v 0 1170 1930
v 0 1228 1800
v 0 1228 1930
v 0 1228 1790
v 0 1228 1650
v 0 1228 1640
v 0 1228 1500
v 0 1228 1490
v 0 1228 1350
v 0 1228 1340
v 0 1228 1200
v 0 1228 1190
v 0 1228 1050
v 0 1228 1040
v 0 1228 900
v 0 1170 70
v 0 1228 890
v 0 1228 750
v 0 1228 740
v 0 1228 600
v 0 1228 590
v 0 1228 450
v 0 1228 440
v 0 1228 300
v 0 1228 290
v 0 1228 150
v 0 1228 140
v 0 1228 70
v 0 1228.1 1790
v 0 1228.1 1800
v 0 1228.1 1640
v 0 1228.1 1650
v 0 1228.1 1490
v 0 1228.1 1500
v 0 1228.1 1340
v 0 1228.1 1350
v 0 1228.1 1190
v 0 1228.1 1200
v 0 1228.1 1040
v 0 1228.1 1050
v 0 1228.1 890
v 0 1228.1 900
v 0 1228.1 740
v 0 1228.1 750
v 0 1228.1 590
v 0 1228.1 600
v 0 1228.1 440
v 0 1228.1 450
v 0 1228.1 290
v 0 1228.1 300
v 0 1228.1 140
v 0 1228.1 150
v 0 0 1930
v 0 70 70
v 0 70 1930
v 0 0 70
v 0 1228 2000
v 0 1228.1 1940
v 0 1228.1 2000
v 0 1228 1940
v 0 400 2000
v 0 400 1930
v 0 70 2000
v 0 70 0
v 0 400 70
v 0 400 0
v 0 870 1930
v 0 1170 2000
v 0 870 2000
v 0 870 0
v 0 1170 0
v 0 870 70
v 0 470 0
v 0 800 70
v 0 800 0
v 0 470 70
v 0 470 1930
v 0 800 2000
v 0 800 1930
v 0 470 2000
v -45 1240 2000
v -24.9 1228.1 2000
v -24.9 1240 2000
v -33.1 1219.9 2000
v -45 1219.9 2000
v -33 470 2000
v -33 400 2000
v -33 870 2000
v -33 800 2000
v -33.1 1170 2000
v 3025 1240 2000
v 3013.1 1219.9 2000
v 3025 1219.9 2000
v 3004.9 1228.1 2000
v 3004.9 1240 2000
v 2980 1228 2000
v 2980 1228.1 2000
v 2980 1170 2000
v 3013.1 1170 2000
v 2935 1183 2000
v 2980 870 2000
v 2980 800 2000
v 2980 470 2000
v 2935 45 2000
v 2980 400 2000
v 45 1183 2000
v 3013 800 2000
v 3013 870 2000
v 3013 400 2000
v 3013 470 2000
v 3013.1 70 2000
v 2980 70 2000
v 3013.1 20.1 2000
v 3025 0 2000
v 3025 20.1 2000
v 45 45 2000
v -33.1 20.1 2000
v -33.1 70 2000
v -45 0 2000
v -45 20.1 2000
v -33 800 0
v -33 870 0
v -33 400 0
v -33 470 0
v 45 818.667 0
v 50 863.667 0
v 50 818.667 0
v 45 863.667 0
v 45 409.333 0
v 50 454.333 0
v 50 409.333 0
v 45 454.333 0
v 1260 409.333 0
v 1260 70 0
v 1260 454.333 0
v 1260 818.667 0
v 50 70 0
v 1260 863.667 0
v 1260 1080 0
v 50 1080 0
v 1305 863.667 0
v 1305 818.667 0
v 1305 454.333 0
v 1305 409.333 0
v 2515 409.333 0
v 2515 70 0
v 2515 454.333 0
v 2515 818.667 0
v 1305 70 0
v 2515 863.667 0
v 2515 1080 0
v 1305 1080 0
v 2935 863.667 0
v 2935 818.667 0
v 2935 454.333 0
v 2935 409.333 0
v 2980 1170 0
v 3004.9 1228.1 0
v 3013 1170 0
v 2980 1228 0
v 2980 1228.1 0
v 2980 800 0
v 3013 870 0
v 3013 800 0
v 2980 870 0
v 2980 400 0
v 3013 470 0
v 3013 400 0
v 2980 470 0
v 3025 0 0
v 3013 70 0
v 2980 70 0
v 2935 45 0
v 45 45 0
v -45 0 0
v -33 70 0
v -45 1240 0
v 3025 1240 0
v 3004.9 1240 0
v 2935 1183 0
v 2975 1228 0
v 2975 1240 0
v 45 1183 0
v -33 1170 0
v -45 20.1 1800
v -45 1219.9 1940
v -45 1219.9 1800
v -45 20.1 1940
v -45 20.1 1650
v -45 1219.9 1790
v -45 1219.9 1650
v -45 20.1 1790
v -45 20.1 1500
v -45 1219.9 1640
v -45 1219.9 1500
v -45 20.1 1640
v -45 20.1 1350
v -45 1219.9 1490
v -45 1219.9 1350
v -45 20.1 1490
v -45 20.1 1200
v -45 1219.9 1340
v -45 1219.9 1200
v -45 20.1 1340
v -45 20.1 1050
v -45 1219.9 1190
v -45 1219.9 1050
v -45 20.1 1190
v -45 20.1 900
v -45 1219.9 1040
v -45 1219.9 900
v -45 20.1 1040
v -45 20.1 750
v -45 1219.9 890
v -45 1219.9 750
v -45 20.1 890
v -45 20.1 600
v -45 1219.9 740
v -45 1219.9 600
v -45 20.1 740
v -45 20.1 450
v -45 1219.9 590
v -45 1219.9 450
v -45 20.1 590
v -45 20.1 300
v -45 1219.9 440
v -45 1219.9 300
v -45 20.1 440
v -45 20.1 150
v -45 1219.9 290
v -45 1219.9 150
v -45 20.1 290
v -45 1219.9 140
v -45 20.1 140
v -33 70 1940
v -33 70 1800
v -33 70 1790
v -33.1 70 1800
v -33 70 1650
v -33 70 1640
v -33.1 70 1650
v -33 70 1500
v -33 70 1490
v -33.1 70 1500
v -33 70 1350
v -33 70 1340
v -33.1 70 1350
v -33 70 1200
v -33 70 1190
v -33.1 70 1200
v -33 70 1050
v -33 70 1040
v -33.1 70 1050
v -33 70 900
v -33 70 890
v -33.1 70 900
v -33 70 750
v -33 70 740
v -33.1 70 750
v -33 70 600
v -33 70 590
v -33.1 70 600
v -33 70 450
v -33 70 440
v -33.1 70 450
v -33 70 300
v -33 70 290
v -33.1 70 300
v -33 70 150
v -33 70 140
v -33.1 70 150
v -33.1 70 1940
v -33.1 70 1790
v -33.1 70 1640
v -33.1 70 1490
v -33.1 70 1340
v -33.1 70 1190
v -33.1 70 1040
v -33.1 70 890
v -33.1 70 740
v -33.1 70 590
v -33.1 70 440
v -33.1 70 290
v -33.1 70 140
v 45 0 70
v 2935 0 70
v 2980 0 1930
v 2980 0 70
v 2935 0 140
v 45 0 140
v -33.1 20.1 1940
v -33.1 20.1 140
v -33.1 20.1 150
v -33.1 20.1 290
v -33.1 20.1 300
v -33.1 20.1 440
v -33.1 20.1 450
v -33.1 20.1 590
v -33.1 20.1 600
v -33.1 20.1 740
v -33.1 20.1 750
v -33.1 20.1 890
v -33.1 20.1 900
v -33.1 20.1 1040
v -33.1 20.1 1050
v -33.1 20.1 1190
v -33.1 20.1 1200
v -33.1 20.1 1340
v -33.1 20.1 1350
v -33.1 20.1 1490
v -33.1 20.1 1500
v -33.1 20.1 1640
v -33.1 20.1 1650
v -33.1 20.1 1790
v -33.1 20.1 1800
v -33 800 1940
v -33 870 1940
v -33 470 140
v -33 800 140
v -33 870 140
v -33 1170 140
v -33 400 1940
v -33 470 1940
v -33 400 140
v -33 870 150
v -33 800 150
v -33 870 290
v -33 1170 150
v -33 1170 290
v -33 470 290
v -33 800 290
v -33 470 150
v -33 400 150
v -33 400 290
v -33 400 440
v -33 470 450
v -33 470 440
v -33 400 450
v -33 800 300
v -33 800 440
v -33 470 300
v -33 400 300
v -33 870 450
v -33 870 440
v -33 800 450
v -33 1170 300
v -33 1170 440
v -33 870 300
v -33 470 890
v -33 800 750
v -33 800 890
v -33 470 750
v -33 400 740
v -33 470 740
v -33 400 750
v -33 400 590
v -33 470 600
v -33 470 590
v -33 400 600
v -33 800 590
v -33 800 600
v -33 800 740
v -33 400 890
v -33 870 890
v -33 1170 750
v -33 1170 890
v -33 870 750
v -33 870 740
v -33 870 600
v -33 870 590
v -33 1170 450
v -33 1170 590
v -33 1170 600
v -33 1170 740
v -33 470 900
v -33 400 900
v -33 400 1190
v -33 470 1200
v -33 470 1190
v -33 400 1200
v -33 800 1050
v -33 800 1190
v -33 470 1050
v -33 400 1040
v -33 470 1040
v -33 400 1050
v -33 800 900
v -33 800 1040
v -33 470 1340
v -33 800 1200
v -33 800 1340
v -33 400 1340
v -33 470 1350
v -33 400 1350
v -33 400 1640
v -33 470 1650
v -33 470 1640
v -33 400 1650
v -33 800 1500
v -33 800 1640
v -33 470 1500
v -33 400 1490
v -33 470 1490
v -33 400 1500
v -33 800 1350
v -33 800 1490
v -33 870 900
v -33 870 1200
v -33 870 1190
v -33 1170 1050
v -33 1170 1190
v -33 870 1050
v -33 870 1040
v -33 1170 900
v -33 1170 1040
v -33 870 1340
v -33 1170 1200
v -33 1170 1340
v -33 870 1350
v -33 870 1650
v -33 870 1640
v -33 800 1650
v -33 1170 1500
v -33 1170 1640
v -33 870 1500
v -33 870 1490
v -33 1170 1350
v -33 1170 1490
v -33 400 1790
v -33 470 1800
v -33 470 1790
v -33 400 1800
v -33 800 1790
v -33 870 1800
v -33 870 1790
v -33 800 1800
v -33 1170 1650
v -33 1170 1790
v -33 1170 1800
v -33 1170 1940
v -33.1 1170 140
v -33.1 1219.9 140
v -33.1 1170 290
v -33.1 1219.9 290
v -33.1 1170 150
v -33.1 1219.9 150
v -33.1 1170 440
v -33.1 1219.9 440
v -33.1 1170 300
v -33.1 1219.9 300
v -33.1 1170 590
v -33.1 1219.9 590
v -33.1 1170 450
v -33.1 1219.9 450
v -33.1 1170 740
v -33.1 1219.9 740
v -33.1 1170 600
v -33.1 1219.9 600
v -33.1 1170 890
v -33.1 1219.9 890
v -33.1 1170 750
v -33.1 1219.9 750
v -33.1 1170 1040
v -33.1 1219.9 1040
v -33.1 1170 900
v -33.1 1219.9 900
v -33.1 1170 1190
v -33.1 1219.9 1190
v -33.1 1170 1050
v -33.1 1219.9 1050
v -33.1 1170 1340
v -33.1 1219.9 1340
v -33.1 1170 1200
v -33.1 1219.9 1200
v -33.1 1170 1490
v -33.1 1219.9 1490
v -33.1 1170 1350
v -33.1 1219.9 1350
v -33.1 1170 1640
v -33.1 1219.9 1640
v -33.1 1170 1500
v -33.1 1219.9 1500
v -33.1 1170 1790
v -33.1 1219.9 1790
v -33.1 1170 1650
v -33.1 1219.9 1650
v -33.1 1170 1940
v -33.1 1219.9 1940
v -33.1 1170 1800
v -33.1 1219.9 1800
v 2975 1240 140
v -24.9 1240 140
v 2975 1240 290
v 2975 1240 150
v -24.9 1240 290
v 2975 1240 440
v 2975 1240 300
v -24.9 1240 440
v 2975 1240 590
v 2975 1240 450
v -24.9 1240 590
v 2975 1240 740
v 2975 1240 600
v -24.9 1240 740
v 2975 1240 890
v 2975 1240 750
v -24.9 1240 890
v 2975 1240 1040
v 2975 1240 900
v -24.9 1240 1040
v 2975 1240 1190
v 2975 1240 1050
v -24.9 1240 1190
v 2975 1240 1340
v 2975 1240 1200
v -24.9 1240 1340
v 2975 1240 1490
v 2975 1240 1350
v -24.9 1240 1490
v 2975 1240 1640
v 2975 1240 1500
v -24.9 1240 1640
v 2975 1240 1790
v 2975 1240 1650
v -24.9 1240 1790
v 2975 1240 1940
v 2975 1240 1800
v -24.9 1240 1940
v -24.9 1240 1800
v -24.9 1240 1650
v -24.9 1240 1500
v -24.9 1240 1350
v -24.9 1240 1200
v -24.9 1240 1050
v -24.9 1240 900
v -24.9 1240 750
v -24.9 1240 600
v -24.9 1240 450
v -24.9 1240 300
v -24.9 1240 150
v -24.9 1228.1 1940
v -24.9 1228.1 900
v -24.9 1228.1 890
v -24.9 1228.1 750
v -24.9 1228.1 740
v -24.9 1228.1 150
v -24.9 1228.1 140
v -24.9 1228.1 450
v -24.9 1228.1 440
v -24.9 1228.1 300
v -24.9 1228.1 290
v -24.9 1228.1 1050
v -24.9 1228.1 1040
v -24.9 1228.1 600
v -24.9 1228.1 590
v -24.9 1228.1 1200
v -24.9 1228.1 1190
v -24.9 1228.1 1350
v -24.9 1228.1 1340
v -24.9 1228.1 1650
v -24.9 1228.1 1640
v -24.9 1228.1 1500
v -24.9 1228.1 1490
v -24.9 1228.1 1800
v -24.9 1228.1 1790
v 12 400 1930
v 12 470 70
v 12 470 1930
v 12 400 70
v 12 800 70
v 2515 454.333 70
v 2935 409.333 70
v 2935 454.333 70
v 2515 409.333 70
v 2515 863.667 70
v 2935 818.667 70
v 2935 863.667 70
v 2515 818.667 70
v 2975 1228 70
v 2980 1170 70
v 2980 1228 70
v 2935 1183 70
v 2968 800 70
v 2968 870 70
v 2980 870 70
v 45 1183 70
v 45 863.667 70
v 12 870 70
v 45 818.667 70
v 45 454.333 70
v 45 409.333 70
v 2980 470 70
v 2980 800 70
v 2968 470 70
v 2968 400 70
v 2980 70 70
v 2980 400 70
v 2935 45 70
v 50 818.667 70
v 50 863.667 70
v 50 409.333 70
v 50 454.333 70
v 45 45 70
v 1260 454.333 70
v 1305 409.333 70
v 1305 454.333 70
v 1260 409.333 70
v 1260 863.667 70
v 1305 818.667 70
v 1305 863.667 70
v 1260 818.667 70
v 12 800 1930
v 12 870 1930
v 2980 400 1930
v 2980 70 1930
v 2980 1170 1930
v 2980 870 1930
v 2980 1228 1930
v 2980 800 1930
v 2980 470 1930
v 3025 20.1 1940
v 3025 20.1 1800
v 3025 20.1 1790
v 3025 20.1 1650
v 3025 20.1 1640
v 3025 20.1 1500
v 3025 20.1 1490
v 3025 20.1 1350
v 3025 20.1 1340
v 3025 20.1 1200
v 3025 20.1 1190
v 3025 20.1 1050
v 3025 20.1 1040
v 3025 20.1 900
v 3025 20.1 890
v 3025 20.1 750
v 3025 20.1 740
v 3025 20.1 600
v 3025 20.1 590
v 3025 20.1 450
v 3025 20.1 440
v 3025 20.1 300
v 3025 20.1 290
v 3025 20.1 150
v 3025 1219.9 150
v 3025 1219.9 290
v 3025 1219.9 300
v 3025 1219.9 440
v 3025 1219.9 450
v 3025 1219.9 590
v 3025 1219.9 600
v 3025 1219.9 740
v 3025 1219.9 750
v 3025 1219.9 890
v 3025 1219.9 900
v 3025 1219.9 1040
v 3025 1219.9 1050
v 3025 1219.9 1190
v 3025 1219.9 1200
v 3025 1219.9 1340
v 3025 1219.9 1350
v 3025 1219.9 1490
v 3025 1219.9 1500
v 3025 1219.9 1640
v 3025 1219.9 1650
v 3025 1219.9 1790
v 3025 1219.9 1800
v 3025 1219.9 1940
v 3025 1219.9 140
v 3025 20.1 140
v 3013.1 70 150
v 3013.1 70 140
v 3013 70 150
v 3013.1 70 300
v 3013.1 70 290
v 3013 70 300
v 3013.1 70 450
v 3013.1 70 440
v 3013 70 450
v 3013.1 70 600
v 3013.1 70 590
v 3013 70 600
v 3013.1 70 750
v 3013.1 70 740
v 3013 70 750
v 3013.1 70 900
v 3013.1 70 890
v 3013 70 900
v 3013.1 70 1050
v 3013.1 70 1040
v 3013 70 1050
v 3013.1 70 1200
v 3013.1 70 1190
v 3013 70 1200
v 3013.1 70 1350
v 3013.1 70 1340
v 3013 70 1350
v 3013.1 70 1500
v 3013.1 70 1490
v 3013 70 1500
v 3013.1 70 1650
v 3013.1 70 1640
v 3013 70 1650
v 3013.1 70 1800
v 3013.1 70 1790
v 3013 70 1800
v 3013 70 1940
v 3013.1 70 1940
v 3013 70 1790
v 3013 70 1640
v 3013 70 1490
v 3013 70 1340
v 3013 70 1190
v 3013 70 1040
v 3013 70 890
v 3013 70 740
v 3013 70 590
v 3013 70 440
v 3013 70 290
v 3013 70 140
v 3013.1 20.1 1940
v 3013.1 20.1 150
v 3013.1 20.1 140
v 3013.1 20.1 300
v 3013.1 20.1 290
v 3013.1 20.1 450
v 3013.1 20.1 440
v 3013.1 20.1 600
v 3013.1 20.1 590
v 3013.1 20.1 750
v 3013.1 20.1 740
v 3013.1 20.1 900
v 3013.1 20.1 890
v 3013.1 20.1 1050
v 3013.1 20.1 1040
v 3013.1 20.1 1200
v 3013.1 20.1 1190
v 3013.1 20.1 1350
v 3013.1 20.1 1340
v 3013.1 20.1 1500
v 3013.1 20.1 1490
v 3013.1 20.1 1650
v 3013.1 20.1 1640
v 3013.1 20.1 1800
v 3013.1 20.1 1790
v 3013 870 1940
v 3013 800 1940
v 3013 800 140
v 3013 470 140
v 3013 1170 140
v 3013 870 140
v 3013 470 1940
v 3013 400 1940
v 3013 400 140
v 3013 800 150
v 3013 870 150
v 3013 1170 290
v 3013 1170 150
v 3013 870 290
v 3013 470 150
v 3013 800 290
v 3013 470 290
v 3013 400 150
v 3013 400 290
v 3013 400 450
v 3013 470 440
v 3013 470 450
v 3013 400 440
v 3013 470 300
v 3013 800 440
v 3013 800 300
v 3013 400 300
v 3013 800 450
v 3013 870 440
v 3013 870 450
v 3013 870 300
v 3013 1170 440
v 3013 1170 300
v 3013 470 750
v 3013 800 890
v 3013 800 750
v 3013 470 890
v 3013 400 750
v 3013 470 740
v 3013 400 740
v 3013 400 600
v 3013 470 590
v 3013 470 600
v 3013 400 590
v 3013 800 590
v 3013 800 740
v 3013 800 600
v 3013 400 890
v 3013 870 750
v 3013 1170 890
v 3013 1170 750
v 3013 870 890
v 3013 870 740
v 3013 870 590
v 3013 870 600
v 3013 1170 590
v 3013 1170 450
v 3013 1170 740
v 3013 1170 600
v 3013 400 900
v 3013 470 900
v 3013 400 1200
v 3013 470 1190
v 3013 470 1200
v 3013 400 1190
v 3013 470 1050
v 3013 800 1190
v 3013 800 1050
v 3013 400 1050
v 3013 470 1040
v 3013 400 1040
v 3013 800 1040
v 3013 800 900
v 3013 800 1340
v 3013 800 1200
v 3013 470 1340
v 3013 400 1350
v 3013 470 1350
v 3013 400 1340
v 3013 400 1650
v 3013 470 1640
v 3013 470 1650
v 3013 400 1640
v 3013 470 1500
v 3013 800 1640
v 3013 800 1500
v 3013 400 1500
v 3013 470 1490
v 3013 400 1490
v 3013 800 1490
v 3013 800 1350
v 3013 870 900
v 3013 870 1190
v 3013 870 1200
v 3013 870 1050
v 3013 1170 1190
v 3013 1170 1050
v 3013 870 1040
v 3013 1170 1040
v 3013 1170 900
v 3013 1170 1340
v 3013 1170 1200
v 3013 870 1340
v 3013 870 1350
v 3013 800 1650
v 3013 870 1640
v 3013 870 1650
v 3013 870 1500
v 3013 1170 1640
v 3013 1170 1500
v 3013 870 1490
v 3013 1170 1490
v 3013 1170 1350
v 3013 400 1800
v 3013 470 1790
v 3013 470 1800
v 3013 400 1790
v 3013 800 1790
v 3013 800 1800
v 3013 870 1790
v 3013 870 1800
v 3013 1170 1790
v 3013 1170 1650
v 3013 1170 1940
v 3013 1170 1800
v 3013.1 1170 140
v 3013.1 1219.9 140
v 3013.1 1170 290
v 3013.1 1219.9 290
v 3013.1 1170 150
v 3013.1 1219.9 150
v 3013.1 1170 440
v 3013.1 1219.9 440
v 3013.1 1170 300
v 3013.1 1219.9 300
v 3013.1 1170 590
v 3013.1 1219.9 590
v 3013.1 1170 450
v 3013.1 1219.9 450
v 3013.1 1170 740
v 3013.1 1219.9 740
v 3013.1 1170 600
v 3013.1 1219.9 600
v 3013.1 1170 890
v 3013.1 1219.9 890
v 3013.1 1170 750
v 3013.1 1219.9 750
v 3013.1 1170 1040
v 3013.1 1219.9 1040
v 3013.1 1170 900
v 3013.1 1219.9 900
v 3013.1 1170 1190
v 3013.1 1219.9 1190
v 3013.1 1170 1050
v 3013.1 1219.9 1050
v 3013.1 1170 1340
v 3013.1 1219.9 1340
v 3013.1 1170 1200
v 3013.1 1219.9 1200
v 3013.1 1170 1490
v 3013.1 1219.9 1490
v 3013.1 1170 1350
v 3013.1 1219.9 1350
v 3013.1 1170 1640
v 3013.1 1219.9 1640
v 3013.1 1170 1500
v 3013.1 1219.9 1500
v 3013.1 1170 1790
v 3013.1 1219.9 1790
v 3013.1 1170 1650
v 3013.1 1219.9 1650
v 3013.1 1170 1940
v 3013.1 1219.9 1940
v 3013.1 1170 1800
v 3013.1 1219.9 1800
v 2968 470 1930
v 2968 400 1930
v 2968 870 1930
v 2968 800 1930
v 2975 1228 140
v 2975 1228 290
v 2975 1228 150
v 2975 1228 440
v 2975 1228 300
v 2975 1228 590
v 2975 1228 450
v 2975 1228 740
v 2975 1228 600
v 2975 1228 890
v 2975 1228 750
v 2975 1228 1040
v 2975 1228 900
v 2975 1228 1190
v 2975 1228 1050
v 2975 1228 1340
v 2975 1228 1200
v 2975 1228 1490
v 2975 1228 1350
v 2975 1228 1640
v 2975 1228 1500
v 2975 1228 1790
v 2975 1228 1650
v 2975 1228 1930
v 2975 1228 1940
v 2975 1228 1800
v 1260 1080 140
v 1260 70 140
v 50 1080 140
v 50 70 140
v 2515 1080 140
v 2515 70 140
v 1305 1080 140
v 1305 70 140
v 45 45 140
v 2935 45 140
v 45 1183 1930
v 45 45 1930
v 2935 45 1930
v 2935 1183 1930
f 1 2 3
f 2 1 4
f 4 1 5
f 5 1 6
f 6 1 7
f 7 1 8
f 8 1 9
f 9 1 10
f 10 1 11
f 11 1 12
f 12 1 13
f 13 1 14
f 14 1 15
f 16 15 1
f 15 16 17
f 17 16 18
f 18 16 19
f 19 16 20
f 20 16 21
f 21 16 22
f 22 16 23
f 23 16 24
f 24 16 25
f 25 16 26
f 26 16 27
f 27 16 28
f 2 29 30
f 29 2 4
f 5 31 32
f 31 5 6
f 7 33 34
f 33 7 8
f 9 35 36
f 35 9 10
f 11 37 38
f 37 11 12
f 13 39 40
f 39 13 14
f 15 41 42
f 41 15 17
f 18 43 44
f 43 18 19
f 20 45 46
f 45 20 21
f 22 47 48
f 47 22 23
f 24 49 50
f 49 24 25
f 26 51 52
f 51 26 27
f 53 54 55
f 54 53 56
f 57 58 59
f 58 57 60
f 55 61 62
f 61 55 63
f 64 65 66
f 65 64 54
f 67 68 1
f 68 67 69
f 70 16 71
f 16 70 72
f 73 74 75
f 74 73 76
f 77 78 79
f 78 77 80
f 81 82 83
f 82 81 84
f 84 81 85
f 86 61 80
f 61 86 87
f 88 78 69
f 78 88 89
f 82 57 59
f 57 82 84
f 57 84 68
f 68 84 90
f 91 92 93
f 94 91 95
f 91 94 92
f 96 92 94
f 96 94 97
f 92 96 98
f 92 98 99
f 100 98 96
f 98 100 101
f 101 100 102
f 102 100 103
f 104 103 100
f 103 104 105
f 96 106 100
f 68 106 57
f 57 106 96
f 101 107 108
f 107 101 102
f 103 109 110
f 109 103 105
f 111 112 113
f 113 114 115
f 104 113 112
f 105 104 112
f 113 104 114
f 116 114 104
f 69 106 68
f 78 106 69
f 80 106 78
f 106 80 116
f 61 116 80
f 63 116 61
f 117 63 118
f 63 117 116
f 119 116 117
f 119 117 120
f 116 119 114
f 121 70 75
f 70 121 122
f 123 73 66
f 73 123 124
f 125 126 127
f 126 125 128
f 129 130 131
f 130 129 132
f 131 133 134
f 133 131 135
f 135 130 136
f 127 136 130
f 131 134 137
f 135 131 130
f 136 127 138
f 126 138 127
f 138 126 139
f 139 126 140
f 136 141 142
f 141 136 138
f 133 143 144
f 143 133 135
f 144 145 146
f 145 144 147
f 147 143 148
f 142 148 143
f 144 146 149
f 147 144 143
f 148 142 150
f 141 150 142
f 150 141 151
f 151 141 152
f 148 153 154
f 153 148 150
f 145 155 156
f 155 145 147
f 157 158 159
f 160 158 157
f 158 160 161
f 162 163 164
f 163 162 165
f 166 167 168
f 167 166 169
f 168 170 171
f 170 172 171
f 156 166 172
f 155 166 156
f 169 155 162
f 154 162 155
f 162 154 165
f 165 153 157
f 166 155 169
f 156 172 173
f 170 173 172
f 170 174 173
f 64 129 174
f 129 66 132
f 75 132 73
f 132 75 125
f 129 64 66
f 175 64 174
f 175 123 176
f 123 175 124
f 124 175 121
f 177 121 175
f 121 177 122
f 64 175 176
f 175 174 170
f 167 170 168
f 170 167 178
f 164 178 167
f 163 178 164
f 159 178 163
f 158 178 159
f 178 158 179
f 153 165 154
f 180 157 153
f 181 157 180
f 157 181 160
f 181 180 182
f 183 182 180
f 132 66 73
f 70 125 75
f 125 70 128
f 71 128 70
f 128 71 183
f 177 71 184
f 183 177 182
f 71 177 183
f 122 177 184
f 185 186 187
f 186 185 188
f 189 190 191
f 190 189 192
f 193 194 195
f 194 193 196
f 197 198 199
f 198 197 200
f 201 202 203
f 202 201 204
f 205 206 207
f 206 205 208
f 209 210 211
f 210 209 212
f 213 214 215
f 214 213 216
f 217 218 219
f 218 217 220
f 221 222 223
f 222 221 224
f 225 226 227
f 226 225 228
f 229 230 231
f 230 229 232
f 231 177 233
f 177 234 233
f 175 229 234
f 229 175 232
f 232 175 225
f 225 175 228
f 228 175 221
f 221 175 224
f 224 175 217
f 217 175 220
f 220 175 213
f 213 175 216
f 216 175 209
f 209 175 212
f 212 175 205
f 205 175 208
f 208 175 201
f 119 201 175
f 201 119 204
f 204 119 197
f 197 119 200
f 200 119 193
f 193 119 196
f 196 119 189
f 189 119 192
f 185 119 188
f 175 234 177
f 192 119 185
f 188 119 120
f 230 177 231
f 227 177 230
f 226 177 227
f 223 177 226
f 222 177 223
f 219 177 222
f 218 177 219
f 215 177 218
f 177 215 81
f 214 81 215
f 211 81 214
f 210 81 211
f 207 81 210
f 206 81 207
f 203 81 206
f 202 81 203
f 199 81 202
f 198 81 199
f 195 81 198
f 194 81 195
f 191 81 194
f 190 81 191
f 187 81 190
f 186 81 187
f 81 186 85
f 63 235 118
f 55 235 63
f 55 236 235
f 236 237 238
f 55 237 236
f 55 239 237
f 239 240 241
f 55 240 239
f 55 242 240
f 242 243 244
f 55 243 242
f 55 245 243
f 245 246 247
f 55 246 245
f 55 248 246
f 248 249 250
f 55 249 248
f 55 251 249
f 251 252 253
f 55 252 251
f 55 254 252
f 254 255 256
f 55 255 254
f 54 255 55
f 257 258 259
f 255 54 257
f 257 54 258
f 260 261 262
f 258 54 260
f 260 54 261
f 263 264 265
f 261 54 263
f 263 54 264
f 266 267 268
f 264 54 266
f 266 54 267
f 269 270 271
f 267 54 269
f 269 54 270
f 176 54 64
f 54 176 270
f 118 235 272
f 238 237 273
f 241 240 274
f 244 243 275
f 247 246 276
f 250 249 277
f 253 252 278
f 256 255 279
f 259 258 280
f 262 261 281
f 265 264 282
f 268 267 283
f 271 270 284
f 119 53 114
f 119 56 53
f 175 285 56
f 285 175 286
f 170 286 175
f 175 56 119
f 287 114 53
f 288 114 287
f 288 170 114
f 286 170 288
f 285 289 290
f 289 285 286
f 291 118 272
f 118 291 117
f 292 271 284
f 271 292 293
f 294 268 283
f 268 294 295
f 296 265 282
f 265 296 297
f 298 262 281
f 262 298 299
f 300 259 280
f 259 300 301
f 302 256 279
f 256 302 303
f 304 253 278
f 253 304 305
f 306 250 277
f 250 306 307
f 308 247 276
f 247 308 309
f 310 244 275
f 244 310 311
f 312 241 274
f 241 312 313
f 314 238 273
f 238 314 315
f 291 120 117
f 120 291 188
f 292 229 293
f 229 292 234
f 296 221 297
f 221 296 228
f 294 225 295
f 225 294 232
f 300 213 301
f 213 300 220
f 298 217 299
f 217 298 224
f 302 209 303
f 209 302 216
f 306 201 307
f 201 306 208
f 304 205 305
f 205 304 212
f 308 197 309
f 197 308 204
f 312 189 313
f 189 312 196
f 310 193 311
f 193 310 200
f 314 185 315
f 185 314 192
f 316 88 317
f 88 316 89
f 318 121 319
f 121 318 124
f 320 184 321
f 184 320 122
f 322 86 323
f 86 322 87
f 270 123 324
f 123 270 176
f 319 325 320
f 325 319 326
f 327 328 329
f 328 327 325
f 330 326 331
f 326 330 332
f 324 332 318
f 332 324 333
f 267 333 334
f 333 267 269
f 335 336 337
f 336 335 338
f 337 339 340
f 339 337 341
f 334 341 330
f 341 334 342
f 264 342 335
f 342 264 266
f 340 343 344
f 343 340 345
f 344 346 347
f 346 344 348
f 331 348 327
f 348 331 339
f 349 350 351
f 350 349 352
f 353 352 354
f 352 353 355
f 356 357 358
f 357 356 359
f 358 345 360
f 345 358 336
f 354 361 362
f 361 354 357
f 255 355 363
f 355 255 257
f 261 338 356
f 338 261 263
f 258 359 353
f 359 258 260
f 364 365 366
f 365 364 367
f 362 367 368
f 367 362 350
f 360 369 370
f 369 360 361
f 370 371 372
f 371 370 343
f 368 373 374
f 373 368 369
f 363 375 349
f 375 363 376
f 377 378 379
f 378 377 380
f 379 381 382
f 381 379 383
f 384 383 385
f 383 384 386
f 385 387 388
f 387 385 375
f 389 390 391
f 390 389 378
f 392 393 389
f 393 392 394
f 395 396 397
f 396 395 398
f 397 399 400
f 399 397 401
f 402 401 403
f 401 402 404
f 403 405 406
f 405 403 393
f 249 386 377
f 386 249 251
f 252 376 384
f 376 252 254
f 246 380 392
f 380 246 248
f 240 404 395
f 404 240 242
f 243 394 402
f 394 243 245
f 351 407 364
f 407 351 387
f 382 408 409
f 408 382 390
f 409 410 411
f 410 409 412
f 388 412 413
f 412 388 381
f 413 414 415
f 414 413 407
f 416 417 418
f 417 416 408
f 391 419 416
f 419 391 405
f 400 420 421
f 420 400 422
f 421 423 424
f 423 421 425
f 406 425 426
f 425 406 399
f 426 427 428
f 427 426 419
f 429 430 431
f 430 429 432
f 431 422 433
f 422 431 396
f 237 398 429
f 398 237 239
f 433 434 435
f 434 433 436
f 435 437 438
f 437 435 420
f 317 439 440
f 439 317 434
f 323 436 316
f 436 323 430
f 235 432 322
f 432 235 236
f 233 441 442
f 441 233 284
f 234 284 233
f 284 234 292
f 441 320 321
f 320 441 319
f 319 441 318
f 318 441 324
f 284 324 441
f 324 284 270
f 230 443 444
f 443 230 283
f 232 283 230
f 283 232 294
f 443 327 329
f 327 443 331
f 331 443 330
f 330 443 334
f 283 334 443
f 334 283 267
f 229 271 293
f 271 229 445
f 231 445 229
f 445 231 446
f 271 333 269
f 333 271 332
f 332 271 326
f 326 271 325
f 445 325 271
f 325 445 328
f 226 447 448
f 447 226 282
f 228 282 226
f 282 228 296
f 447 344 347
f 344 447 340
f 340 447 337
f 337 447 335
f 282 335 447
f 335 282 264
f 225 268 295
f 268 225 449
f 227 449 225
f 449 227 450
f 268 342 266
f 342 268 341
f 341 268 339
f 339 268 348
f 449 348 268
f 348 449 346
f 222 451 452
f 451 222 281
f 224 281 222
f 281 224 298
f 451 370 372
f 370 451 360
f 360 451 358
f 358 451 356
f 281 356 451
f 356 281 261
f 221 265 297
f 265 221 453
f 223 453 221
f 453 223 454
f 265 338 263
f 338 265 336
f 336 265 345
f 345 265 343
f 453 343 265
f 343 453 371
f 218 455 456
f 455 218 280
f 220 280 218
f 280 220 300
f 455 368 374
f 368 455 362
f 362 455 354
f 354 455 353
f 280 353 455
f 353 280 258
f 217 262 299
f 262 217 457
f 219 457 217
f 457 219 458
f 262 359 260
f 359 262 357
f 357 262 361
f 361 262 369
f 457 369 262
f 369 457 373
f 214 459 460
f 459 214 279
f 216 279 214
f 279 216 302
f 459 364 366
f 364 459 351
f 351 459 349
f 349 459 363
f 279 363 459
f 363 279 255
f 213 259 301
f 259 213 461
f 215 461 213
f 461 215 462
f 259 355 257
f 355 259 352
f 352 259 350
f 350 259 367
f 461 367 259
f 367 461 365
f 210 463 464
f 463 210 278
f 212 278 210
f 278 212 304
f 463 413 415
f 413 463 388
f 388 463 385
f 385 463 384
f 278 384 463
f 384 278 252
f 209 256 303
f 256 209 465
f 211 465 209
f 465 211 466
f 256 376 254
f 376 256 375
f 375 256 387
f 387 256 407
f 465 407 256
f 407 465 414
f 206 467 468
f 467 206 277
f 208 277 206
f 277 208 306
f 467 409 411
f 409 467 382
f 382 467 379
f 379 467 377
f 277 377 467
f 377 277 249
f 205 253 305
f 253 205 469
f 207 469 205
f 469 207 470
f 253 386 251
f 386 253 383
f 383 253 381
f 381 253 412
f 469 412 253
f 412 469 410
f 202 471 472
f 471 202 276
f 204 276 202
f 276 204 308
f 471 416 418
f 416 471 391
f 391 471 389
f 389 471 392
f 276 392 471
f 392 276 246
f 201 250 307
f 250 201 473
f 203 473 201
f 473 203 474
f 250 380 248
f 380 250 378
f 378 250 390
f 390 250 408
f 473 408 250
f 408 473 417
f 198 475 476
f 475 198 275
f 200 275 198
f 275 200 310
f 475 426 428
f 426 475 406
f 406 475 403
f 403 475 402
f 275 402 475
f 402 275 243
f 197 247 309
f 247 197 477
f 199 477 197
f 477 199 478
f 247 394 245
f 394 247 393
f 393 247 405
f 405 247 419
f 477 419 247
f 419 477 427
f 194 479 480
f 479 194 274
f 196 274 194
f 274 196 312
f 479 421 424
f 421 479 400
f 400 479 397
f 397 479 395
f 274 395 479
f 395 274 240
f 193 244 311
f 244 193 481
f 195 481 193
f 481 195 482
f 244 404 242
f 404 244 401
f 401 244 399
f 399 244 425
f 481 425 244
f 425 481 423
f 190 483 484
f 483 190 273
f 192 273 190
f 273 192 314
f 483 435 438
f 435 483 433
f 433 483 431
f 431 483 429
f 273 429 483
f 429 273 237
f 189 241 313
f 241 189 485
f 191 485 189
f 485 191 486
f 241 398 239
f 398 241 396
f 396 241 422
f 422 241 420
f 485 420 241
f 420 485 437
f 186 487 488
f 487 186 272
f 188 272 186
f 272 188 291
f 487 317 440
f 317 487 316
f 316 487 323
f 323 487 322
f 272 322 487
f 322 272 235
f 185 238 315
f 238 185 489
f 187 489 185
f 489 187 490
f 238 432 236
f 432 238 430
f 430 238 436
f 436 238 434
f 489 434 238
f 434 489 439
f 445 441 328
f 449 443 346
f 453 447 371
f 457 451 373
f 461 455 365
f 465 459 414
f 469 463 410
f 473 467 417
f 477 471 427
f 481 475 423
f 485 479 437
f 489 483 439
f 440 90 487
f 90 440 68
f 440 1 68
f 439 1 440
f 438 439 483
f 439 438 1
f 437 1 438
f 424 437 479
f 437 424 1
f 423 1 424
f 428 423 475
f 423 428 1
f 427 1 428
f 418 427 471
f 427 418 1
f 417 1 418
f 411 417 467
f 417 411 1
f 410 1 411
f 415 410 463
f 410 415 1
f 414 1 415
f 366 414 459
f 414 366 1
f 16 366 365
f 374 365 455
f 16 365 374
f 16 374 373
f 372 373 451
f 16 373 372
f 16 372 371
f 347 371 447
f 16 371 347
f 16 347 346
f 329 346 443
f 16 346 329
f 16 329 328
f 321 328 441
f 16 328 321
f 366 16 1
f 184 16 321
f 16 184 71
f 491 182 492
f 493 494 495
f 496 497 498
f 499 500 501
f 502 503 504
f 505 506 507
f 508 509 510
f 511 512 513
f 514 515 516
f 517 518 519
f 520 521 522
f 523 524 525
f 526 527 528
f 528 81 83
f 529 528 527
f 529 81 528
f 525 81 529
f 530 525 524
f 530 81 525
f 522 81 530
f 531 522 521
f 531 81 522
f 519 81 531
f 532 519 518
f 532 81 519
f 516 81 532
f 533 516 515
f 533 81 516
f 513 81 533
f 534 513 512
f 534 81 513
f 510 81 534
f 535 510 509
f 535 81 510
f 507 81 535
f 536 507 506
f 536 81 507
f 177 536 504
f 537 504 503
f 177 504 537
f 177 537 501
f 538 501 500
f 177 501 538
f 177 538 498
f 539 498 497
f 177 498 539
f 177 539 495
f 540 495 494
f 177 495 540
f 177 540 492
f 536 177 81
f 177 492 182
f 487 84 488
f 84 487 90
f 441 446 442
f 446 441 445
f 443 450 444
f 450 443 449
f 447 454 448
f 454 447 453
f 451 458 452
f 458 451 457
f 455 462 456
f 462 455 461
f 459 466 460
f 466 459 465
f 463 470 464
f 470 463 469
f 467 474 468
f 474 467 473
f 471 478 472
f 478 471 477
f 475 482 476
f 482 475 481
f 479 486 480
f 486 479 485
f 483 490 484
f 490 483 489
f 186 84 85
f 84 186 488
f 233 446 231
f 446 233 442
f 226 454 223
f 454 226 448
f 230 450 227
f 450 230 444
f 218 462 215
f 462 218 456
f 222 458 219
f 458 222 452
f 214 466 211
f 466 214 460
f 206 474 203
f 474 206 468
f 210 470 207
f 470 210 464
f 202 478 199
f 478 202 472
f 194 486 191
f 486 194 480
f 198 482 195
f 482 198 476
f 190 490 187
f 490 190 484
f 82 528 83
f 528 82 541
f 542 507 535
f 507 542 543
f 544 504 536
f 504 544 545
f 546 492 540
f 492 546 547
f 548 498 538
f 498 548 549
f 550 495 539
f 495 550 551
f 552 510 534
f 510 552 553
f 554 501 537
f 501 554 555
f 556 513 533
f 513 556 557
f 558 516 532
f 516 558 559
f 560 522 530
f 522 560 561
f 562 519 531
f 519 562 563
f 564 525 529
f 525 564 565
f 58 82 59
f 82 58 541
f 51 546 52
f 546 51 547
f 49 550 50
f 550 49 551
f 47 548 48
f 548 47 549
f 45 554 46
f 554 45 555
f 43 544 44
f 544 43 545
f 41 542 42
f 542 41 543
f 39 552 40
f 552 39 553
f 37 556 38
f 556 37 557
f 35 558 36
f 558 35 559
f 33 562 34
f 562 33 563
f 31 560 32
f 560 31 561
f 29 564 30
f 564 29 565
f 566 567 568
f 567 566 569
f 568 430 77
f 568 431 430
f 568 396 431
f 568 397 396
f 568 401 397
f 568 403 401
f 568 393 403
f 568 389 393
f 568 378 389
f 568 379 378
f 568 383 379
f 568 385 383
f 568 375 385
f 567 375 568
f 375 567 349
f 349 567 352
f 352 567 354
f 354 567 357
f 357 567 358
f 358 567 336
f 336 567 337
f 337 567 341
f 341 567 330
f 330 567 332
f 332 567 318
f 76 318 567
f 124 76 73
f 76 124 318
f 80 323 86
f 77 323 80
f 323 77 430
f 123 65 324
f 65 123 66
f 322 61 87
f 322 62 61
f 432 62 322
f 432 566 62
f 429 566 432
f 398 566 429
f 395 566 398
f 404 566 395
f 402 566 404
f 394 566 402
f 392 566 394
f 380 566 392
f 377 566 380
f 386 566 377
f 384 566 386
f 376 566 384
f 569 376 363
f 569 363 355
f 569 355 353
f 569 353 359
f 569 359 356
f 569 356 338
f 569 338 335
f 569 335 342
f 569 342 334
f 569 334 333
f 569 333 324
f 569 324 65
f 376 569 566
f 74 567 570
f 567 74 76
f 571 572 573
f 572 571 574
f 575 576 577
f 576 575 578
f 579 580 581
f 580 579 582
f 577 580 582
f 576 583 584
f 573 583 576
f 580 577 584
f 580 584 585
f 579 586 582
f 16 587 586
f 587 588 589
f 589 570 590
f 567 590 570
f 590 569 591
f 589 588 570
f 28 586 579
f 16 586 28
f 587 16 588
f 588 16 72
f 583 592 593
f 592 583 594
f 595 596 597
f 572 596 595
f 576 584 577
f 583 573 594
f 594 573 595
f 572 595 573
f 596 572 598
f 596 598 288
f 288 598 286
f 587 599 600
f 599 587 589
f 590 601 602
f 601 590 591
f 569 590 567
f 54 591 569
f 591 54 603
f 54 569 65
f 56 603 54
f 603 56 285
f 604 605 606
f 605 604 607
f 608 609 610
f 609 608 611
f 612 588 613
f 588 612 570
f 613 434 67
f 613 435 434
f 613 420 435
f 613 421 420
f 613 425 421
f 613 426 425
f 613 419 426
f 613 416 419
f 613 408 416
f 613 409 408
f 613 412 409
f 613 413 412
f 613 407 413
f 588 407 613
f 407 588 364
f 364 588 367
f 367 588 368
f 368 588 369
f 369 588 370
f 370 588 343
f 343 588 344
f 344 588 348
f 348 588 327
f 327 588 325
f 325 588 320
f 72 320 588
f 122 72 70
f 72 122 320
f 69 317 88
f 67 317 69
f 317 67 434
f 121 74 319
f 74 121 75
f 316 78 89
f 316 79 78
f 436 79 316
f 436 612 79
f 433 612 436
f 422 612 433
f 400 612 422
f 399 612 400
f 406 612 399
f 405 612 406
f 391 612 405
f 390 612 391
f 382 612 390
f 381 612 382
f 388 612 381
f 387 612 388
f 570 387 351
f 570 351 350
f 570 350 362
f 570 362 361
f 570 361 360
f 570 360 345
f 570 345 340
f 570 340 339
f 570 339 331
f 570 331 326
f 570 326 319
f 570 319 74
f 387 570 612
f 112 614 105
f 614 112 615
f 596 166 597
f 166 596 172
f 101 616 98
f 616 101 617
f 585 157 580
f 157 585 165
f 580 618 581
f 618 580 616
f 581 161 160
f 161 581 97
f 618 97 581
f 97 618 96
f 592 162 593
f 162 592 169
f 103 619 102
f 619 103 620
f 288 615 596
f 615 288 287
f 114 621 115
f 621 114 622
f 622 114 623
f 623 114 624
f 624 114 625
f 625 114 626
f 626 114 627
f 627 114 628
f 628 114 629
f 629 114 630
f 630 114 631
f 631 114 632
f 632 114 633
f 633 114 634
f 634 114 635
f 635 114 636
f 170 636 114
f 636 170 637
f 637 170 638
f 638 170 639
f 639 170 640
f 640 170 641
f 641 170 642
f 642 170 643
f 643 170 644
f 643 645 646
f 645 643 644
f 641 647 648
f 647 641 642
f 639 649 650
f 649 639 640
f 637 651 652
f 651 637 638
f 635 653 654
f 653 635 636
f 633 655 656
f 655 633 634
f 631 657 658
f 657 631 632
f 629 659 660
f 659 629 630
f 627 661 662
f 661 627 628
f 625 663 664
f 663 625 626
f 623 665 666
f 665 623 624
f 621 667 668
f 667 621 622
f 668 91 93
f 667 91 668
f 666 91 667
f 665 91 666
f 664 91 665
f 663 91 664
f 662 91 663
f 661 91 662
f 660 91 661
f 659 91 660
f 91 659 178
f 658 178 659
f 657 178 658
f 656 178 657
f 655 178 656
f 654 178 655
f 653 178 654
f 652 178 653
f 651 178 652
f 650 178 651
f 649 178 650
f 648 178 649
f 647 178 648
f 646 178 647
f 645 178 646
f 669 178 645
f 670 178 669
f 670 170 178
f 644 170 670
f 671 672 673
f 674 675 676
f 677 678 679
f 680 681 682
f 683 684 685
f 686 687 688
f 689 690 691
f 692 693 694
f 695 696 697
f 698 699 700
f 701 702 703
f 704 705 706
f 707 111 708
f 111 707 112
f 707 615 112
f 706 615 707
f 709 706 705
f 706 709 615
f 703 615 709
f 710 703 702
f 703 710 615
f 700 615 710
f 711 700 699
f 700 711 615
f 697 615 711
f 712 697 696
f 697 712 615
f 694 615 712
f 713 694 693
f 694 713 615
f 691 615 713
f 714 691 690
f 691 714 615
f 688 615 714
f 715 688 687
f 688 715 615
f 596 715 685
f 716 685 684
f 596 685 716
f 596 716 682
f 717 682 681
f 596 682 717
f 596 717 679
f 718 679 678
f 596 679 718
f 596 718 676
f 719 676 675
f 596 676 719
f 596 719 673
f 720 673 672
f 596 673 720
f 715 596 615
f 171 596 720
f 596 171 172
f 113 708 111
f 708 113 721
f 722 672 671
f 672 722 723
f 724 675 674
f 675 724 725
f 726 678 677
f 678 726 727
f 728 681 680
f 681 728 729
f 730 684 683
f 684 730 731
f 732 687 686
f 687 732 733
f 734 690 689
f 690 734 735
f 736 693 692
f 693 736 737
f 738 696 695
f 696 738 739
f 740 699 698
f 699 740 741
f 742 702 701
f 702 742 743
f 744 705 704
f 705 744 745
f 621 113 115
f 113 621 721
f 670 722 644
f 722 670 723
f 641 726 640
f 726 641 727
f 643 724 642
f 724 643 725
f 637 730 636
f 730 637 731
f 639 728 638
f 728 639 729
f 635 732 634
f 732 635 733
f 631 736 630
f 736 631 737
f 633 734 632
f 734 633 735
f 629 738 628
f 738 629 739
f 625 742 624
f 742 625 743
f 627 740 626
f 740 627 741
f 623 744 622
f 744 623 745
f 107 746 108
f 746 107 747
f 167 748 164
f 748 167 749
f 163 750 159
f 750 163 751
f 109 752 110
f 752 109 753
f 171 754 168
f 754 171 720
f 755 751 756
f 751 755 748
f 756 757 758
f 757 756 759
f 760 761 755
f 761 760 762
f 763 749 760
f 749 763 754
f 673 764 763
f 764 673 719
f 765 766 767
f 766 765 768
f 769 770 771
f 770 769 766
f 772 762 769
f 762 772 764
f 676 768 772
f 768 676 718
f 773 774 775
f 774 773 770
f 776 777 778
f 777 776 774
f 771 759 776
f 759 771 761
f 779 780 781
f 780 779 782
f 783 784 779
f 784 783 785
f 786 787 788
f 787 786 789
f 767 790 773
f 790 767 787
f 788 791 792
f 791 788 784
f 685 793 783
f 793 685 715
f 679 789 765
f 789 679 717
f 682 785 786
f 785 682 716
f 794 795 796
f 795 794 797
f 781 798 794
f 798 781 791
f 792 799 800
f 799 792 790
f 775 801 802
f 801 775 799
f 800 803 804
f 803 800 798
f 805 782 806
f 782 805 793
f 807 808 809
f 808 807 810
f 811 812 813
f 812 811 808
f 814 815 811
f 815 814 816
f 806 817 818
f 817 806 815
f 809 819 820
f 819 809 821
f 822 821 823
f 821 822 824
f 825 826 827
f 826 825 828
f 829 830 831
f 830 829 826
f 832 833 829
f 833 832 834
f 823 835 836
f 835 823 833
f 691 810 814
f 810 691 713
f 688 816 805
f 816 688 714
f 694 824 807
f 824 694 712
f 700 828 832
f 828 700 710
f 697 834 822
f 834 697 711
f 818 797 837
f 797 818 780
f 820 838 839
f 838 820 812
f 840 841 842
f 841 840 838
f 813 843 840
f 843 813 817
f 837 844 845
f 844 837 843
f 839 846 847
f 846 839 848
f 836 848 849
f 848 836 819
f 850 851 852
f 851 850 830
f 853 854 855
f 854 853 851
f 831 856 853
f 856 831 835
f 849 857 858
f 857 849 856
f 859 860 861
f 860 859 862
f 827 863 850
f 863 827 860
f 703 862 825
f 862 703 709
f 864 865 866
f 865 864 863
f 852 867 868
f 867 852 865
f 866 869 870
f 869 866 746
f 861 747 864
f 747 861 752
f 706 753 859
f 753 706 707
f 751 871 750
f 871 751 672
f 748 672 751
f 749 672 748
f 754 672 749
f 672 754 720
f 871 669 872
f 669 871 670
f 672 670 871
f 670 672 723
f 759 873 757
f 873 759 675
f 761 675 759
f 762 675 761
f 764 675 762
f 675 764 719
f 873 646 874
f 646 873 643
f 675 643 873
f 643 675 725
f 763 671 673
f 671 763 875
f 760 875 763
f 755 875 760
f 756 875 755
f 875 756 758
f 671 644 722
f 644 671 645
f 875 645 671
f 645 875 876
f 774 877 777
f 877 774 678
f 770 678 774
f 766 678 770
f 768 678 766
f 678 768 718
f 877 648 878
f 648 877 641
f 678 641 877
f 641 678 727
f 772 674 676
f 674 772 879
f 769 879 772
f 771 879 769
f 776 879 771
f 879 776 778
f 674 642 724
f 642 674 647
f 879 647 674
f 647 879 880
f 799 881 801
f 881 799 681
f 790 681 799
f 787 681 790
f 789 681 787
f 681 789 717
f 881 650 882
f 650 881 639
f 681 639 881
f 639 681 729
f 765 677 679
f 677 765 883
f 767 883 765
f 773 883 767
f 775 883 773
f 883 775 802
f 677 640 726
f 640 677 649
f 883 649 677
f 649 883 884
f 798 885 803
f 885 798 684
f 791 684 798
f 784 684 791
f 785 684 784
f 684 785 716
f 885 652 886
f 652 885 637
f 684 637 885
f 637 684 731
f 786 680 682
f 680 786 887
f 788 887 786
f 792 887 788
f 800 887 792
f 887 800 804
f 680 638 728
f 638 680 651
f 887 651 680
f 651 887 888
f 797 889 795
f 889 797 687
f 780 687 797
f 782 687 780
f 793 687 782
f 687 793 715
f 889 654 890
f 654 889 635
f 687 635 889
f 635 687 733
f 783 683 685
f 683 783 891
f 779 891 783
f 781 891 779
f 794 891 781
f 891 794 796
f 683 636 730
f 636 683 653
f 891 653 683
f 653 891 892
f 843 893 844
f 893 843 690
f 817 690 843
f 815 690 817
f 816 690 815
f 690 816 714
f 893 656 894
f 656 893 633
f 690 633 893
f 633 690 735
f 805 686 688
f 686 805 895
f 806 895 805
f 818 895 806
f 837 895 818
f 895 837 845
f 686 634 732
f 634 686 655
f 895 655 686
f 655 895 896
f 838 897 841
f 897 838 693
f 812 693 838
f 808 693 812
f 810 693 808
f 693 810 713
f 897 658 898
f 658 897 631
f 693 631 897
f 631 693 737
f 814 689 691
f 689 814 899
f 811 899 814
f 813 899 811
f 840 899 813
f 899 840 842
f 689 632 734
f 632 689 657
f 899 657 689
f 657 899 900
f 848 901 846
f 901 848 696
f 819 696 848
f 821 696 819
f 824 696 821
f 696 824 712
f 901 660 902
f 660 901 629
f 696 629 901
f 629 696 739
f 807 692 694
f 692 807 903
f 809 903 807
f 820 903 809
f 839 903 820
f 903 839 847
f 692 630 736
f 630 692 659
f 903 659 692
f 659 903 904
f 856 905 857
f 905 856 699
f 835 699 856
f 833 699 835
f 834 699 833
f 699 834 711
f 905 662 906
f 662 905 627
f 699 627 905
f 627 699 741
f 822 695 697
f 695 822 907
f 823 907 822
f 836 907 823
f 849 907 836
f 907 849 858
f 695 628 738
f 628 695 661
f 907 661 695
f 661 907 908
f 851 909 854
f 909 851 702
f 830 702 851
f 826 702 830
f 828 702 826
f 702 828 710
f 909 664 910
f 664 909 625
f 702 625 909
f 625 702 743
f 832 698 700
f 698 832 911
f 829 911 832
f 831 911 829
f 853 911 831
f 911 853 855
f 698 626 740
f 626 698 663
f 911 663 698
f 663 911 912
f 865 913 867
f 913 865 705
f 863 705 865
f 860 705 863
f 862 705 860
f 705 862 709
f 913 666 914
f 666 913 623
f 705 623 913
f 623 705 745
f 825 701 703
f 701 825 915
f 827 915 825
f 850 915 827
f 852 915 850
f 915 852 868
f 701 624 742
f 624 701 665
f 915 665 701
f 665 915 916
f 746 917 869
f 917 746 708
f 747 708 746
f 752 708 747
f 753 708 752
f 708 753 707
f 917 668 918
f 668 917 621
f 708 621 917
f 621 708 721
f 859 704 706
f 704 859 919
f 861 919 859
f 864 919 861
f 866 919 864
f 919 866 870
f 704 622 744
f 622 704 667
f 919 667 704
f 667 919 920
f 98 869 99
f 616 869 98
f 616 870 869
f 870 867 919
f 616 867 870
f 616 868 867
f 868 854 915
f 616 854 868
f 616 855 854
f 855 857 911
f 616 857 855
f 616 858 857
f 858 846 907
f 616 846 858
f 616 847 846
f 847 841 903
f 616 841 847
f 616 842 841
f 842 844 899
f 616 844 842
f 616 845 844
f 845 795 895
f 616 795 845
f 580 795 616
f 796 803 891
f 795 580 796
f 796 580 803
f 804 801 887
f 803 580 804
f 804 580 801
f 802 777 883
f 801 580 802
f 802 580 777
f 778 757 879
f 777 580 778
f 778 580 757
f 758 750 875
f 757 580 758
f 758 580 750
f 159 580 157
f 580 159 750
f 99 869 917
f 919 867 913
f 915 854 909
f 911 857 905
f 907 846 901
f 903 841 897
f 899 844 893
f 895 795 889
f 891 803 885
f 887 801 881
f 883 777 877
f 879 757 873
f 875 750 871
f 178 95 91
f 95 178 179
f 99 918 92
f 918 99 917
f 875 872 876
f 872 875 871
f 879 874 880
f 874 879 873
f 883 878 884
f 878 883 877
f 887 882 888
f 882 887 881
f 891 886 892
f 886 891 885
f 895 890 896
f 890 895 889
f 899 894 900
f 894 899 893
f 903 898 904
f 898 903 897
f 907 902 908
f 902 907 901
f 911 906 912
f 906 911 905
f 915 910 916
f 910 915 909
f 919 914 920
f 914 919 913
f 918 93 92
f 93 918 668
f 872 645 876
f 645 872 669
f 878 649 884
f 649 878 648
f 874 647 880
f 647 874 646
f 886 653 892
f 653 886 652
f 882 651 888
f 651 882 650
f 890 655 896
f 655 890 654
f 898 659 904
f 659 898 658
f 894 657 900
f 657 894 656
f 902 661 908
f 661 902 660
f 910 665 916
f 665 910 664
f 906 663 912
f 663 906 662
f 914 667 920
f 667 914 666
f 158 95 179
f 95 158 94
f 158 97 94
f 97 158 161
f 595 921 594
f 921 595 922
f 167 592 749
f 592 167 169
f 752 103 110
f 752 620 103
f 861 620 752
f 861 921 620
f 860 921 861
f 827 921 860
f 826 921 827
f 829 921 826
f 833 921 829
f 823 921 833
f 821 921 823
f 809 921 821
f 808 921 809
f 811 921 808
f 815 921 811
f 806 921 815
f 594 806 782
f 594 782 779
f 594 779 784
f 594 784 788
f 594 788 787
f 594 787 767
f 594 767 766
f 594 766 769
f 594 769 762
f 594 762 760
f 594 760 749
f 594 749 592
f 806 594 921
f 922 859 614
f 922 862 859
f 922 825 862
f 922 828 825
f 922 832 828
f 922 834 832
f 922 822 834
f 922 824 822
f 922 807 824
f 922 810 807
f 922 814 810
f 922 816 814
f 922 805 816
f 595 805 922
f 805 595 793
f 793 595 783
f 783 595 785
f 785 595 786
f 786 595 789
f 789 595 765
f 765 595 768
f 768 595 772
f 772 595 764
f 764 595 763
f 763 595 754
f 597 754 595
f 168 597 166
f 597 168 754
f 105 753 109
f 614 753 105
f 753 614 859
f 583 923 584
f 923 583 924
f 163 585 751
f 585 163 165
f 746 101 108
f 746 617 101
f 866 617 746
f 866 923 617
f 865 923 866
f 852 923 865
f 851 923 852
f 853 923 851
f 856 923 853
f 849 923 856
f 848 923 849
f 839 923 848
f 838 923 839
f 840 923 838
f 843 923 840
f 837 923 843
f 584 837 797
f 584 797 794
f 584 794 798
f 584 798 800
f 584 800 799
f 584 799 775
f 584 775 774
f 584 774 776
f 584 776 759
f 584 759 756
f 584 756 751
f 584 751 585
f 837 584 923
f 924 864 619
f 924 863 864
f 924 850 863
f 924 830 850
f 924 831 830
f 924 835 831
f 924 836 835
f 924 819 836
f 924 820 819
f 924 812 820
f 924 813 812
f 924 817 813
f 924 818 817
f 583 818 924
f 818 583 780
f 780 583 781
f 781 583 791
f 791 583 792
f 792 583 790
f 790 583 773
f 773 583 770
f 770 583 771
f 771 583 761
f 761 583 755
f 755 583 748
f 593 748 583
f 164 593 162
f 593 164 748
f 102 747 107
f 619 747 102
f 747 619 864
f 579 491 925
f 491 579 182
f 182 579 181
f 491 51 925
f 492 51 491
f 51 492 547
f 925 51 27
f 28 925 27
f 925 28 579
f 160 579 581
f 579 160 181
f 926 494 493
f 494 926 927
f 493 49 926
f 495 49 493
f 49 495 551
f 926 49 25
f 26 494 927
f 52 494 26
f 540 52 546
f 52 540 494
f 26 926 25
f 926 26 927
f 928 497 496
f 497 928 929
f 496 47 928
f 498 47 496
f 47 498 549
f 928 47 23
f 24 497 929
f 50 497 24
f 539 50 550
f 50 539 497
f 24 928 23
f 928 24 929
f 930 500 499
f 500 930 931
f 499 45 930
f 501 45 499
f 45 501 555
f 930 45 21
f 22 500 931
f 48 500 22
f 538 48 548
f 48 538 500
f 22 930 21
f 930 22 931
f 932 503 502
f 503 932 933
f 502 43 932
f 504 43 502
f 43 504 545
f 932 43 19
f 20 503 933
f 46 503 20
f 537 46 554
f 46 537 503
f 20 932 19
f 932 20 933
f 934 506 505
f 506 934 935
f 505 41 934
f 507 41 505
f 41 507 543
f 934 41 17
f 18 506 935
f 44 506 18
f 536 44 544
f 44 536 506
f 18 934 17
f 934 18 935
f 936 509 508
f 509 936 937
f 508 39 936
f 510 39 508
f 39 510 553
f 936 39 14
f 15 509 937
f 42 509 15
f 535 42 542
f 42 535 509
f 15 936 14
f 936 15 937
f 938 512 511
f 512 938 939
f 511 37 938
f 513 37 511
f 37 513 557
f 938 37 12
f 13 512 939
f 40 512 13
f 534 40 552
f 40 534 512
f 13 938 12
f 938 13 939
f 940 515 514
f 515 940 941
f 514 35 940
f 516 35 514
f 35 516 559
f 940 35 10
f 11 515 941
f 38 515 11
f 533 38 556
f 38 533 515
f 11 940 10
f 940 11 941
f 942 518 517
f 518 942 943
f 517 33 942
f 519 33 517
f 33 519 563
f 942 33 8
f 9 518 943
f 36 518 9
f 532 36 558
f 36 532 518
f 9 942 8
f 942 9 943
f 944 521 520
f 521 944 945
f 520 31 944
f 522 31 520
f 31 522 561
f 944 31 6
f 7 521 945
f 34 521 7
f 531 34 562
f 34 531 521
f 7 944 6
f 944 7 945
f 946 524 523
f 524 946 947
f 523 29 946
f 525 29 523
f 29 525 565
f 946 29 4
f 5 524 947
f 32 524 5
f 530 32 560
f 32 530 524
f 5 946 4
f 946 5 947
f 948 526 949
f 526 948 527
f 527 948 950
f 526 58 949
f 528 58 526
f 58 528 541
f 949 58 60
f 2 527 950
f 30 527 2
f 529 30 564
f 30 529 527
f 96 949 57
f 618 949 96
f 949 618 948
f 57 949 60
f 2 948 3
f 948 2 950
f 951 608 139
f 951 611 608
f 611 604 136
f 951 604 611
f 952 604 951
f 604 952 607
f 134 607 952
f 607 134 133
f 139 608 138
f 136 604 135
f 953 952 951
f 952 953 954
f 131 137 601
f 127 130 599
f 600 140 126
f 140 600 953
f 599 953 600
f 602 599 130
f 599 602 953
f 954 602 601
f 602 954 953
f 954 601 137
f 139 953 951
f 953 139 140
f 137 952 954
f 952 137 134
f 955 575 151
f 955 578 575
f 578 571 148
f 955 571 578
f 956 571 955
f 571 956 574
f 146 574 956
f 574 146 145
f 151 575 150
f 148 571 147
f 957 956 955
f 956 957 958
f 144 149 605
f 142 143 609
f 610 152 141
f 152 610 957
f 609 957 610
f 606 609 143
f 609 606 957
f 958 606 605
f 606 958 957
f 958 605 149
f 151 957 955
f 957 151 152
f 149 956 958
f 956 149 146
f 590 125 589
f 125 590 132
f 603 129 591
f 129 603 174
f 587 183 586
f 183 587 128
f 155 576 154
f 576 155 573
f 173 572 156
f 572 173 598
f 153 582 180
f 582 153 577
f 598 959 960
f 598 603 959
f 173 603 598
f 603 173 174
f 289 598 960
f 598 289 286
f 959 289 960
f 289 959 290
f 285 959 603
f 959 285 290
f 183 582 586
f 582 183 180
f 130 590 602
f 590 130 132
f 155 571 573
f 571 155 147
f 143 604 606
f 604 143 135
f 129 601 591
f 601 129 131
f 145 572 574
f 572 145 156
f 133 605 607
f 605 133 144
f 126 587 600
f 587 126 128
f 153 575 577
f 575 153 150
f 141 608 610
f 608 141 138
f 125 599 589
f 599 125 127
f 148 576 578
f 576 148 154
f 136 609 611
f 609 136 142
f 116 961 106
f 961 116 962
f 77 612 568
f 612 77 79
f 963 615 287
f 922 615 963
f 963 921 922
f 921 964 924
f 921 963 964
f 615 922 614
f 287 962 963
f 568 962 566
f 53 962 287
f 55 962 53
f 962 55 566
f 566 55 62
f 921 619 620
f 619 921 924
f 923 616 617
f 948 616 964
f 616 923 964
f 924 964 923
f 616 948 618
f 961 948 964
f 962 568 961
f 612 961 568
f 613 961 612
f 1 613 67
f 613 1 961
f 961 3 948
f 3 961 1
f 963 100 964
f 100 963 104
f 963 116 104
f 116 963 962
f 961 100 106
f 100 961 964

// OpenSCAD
post = [45,70,2000];
cladding = [1200,12,140];
pallet = [1210,1010,140];
corner = 20;
cladding_depth = 1200;
cladding_width = 3000;

inner_depth = cladding_depth + 2 * corner - cladding.y;
inner_width = cladding_width - 2* post.x - corner;


module front_post(){
	difference() {
		cube(post);
		translate([ -0.1, corner+0.1, -1])cube([cladding.y,post.y - corner,post.z+2]);
	}
}

module rear_post(){
	difference() {
		translate([ 0, post.y, 0])mirror([0,1,0])front_post();
		translate([ corner + 0.1, post.y - cladding.y + 0.1, -1]) cube([post.x - corner,cladding.y,post.z+2]);
	}
}

module clad(){
	color("white")
	cube([cladding.y, cladding_depth, cladding.z] );
}

module clad_back(){
	color("white")
	cube([cladding_width, cladding.y, cladding.z] );
}

module wall_post(){
	difference() {
		cube(post);
		translate([post.x - cladding.y,-1,-1])cube([cladding.y + 1, post.y + 2, post.y + 1]);
		translate([post.x - cladding.y,-1,post.z - post.y + 1])cube([cladding.y + 1, post.y + 2, post.y + 1]);
	}
}


module left_wall() {
	translate([-post.x,0,0]){
		front_post();

		for(i=[0:12])
			translate([0,corner,i * (cladding.z+10)])clad();
		
		translate([ 0, cladding_depth - (post.y - corner) + corner, 0])rear_post();

		translate([cladding.y,cladding_depth * 1/3,0])wall_post();

		translate([cladding.y,cladding_depth * 2/3,0])wall_post();

	}
}

module pallet(){
	color("blue")
	cube(pallet);
}

module right_wall(){
	mirror([1,0,0])left_wall();
}

module rear_wall(){
	for(i=[0:12])
			translate([0,0,i * (cladding.z+10)])clad_back();
}

module floor(){
	cube([ post.x, inner_depth, post.y]);
	translate([ cladding_width - corner - post.x, 0, 0])cube([ post.x, inner_depth, post.y]);

	translate([ post.x, 0, 0])cube([inner_width, post.x, post.y]);
	translate([ post.x, 0, post.y])cube([inner_width, post.x, post.y]);
	
	translate([ post.x, inner_depth - post.x, 0])cube([inner_width, post.x, post.y]);

	translate([ post.x, inner_depth * 1/3, 0])cube([inner_width, post.x, post.y]);
	translate([ post.x, inner_depth * 2/3, 0])cube([inner_width, post.x, post.y]);


}

module ceiling(){
	translate([0, 0, post.z - post.y]){
		cube([ post.x, inner_depth, post.y]);
		translate([ cladding_width - corner - post.x, 0, 0])cube([ post.x, inner_depth, post.y]);
		translate([ post.x, 0, 0])cube([inner_width, post.x, post.y]);
		translate([ post.x, inner_depth - post.x, 0])cube([inner_width, post.x, post.y]);
	}
}

module pallets(){
	translate([ 50, 70, 0])pallet();
	translate([ 50 + pallet.x + post.x, 70, 0])pallet(); 	
}

module asm(){
	left_wall();
	translate([cladding_width - corner, 0, 0])right_wall();
	translate([-(post.x - corner),cladding_depth + corner*2 - cladding.y,0])rear_wall();
	pallets();
	floor();
	ceiling();
}

asm();
